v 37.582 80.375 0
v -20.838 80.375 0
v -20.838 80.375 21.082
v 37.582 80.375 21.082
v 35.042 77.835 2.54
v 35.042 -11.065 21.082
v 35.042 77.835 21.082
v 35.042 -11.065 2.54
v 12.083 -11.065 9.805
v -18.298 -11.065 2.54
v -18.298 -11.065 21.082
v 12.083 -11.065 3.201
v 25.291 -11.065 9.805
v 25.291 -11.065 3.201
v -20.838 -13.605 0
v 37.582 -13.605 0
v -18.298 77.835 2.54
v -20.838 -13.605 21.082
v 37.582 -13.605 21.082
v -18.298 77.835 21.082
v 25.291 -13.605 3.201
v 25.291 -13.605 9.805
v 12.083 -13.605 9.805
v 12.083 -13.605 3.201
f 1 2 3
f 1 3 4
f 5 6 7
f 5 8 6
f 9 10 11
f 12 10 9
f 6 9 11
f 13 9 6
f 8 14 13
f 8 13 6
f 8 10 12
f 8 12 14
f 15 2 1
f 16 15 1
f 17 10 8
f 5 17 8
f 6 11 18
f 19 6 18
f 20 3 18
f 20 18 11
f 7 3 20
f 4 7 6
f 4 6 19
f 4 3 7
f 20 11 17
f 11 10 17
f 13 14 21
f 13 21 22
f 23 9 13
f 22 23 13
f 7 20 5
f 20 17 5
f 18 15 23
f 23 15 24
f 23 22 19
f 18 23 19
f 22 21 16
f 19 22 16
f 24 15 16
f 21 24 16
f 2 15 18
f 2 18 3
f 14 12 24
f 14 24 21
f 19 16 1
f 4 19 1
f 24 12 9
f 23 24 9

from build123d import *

# Parameters (mm, degrees)
F0_W     = 58.42
F0_H     = 93.98
F1_DEPTH = 21.082
F2_T     = -2.54
F3_W     = 13.208
F3_H     = 6.604
F4_DEPTH = 44.37549


with BuildPart() as f1:
    # F0 (on Top) → F1 (new body)
    with BuildSketch(Plane.XY):
        with Locations((8.371627, 33.384961)):
            Rectangle(F0_W, F0_H)
    extrude(amount=F1_DEPTH)

    # F2
    f2_openings = [f1.faces().sort_by_distance(p)[0] for p in [
        (8.371627, 33.384961, 21.082),
    ]]
    offset(amount=F2_T, openings=f2_openings)

    # F3 (on Front) → F4 (cut)
    with BuildSketch(Plane.XZ):
        with Locations((18.686646, 6.503384)):
            Rectangle(F3_W, F3_H)
    extrude(amount=F4_DEPTH, mode=Mode.SUBTRACT)


solid = f1.part
